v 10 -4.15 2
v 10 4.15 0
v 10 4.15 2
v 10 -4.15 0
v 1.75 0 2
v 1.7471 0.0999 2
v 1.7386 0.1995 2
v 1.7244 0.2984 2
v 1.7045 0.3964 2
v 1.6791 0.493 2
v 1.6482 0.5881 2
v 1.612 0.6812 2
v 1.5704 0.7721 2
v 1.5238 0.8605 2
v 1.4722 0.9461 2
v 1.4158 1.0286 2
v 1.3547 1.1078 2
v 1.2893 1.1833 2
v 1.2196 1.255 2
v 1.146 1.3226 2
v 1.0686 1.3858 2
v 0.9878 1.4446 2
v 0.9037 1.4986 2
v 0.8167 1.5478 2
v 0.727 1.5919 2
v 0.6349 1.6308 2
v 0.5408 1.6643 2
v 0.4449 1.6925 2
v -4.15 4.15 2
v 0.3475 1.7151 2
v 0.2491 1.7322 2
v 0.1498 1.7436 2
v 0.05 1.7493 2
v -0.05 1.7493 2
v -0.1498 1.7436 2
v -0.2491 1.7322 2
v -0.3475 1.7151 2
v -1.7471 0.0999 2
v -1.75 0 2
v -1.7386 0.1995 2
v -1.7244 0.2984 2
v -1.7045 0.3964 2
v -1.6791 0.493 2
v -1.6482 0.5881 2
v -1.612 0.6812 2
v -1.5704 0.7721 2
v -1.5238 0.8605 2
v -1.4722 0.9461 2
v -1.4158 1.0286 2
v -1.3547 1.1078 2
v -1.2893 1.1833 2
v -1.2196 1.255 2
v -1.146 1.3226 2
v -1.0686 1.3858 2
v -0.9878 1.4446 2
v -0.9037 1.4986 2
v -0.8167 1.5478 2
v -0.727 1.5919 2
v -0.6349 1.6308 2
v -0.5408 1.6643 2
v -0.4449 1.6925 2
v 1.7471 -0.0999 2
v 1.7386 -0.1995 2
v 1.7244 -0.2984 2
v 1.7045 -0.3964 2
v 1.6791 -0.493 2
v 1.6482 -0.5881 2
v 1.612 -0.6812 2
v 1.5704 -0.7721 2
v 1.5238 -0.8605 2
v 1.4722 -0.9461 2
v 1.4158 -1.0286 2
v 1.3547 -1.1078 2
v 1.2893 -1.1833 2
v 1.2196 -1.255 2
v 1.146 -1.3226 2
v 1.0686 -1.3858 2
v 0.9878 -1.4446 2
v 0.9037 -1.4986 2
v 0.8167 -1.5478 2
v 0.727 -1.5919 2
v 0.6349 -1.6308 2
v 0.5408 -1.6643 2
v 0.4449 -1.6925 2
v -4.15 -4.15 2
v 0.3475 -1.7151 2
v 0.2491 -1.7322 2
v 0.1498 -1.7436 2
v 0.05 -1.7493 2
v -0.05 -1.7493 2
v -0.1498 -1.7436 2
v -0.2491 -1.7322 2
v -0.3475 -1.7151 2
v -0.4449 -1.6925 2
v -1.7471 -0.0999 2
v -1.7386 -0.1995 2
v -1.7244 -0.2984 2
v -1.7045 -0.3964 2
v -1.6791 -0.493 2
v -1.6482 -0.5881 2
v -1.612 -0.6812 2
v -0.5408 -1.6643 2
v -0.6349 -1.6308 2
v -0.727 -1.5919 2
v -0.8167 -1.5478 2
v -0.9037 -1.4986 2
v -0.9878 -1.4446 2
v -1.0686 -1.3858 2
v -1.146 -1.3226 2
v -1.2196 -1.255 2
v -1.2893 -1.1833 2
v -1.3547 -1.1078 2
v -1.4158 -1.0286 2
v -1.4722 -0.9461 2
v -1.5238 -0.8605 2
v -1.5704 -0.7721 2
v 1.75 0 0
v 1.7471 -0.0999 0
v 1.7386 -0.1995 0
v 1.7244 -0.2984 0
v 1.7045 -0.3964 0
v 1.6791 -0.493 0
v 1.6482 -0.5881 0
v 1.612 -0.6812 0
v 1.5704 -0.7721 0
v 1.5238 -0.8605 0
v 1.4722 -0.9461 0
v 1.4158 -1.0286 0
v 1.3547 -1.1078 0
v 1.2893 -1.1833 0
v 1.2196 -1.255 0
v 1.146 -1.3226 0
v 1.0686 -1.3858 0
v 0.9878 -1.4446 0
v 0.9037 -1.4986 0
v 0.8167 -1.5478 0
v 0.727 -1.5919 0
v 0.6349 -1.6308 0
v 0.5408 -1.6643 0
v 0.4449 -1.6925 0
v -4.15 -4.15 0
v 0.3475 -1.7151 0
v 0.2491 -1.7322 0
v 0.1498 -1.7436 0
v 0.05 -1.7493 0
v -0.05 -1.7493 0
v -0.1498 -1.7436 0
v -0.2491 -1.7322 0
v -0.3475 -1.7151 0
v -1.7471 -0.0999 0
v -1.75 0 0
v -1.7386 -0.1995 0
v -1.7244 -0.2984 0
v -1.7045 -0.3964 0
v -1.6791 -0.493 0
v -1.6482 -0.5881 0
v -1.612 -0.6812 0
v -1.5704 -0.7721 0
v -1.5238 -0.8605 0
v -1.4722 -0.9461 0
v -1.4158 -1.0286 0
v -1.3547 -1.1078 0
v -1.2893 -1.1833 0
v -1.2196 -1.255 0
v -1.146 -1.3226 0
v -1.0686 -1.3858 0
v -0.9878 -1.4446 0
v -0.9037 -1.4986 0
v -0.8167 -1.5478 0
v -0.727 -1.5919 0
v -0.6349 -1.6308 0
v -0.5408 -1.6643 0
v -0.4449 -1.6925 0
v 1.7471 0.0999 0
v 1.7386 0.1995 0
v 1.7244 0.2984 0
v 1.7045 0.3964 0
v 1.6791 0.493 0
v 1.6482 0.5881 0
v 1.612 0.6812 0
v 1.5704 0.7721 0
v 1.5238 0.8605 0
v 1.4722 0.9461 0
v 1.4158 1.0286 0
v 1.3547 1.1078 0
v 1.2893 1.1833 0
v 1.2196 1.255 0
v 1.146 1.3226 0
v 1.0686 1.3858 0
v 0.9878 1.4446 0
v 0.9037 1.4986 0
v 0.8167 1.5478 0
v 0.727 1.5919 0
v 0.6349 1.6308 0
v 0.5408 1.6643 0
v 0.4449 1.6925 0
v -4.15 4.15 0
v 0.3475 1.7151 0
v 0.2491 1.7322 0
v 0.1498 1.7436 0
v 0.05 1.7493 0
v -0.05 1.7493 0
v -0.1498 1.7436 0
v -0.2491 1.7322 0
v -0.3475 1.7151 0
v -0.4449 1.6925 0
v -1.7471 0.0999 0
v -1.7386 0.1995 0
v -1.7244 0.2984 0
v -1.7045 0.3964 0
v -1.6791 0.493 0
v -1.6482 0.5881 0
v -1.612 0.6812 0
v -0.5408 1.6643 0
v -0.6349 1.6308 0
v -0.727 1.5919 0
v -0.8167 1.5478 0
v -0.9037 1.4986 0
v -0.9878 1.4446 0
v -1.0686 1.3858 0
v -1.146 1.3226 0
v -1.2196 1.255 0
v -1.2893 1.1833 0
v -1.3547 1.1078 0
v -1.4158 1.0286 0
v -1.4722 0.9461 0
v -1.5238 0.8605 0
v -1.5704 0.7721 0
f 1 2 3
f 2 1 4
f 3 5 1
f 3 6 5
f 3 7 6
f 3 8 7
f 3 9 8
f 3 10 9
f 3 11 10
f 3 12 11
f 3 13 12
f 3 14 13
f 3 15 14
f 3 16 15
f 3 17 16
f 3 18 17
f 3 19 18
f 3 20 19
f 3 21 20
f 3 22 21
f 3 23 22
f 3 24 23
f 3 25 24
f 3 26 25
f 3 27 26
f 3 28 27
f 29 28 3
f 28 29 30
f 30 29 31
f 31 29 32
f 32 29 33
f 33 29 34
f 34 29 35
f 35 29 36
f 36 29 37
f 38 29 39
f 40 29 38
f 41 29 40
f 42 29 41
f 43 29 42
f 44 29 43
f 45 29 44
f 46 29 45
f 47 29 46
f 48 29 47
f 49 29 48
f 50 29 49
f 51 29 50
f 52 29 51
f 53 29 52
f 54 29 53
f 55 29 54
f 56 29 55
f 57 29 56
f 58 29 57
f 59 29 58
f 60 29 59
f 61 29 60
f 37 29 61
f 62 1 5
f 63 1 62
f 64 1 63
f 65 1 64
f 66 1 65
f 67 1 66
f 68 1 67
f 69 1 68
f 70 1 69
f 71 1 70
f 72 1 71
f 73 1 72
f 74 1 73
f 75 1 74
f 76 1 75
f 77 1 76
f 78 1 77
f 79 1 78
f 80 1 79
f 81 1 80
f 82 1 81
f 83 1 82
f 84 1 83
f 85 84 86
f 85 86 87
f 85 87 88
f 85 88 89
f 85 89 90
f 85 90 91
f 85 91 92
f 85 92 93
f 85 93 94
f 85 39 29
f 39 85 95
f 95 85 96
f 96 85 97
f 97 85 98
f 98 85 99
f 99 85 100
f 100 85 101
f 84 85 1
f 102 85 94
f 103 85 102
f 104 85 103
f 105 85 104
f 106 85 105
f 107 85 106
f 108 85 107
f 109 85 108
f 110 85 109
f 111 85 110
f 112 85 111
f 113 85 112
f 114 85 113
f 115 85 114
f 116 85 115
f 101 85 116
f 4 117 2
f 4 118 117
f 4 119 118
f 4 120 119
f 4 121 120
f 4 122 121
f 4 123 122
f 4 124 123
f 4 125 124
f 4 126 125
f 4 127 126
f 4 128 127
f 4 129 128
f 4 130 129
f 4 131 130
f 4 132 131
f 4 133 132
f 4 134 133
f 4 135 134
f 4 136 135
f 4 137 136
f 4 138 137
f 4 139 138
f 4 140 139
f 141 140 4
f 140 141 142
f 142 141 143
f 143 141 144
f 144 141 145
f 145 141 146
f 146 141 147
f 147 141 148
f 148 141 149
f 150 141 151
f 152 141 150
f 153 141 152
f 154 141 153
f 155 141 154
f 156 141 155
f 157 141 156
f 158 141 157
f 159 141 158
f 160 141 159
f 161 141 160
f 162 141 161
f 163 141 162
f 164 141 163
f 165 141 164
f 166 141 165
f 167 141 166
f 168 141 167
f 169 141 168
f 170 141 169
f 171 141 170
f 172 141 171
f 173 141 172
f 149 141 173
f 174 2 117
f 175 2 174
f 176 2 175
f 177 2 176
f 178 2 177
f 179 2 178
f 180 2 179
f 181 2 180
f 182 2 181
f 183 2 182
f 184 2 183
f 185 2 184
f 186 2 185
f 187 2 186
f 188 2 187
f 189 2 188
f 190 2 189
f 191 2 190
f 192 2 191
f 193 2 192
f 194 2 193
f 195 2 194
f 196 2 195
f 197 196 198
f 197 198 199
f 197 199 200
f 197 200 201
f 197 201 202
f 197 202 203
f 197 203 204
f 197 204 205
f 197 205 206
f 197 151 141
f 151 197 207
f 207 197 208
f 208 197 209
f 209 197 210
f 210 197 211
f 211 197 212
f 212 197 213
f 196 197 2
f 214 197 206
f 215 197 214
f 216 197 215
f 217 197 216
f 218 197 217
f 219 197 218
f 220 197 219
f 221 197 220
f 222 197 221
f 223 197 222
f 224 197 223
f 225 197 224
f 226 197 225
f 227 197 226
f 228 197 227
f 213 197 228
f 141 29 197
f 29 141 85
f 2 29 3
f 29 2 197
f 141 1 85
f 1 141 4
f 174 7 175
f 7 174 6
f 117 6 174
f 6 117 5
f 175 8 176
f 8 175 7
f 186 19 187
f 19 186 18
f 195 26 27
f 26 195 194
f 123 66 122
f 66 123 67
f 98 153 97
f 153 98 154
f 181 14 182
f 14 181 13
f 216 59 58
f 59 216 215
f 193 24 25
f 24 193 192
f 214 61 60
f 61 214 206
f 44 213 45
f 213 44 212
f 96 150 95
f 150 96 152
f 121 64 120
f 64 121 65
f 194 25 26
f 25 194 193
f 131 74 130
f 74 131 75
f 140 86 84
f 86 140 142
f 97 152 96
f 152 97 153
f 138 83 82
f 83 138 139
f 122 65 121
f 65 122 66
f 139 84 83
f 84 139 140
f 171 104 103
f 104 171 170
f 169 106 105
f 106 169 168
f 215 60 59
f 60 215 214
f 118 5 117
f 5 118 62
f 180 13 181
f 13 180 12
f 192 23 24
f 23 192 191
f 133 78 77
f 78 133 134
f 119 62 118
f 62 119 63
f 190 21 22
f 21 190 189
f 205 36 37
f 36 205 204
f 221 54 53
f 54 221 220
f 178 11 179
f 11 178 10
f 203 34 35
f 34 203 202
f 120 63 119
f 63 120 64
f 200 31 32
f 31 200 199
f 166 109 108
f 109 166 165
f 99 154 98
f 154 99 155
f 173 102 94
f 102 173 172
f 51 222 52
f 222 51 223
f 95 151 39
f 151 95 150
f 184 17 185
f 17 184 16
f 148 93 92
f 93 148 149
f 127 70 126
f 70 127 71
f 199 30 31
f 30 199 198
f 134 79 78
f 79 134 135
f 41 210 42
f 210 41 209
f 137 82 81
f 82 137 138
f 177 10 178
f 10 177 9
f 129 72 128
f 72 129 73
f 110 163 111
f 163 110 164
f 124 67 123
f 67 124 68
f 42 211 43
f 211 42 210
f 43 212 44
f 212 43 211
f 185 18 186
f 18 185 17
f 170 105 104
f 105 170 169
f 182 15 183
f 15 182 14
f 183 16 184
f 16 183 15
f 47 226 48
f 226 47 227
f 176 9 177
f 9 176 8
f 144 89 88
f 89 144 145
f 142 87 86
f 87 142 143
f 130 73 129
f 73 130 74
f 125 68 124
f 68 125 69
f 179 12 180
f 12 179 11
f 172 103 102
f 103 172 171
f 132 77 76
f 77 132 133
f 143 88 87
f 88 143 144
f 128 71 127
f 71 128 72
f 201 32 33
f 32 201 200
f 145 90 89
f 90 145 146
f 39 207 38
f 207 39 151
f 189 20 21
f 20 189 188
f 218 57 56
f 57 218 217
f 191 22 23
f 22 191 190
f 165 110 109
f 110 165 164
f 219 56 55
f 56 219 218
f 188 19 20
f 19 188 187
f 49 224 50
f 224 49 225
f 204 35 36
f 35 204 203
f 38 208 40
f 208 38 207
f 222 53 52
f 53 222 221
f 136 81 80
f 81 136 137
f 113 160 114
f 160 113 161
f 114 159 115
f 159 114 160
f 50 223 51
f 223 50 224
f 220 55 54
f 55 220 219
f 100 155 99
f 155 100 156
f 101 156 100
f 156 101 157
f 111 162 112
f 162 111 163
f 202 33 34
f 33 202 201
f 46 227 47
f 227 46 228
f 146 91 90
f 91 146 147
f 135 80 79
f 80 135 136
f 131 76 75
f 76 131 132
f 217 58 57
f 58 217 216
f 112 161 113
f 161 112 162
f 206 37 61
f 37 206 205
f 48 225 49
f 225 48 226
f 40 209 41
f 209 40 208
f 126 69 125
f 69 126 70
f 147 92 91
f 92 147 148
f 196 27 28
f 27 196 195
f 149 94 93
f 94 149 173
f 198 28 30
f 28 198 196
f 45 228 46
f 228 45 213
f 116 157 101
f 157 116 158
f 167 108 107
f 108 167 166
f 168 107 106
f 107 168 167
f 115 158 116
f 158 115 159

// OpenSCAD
// -*- mode: SCAD ; c-file-style: "ellemtel" ; coding: utf-8 -*-
//
// Buchse (bushing)
//
// Copyright 2017 Roland Sieker <ospalh@gmail.com>
// Licence: CC-0 4.0


l = 10; // [5:1:15]
preview = false;

/* [Hidden] */


d_i = 3.5;
w = 2.4;
p = 2;


ms = 0.01;  // Muggeseggele

d_a = d_i + 2*w;
lg = l + d_a/2;

pa = 5;
ps = 1;
ra = 1;
rs = 0.1;
function na() = (preview) ? pna : rna;
function nb() = (preview) ? pnb : rnb;
$fs = (preview) ? ps : rs;
$fa = (preview) ? pa : ra;



difference()
{
   translate([-d_a/2, -d_a/2,0])
   {
      cube([lg, d_a, p]);
   }
    translate([0,0,-ms])
    {
       cylinder(d=d_i, h=p+2*ms);
    }
}
